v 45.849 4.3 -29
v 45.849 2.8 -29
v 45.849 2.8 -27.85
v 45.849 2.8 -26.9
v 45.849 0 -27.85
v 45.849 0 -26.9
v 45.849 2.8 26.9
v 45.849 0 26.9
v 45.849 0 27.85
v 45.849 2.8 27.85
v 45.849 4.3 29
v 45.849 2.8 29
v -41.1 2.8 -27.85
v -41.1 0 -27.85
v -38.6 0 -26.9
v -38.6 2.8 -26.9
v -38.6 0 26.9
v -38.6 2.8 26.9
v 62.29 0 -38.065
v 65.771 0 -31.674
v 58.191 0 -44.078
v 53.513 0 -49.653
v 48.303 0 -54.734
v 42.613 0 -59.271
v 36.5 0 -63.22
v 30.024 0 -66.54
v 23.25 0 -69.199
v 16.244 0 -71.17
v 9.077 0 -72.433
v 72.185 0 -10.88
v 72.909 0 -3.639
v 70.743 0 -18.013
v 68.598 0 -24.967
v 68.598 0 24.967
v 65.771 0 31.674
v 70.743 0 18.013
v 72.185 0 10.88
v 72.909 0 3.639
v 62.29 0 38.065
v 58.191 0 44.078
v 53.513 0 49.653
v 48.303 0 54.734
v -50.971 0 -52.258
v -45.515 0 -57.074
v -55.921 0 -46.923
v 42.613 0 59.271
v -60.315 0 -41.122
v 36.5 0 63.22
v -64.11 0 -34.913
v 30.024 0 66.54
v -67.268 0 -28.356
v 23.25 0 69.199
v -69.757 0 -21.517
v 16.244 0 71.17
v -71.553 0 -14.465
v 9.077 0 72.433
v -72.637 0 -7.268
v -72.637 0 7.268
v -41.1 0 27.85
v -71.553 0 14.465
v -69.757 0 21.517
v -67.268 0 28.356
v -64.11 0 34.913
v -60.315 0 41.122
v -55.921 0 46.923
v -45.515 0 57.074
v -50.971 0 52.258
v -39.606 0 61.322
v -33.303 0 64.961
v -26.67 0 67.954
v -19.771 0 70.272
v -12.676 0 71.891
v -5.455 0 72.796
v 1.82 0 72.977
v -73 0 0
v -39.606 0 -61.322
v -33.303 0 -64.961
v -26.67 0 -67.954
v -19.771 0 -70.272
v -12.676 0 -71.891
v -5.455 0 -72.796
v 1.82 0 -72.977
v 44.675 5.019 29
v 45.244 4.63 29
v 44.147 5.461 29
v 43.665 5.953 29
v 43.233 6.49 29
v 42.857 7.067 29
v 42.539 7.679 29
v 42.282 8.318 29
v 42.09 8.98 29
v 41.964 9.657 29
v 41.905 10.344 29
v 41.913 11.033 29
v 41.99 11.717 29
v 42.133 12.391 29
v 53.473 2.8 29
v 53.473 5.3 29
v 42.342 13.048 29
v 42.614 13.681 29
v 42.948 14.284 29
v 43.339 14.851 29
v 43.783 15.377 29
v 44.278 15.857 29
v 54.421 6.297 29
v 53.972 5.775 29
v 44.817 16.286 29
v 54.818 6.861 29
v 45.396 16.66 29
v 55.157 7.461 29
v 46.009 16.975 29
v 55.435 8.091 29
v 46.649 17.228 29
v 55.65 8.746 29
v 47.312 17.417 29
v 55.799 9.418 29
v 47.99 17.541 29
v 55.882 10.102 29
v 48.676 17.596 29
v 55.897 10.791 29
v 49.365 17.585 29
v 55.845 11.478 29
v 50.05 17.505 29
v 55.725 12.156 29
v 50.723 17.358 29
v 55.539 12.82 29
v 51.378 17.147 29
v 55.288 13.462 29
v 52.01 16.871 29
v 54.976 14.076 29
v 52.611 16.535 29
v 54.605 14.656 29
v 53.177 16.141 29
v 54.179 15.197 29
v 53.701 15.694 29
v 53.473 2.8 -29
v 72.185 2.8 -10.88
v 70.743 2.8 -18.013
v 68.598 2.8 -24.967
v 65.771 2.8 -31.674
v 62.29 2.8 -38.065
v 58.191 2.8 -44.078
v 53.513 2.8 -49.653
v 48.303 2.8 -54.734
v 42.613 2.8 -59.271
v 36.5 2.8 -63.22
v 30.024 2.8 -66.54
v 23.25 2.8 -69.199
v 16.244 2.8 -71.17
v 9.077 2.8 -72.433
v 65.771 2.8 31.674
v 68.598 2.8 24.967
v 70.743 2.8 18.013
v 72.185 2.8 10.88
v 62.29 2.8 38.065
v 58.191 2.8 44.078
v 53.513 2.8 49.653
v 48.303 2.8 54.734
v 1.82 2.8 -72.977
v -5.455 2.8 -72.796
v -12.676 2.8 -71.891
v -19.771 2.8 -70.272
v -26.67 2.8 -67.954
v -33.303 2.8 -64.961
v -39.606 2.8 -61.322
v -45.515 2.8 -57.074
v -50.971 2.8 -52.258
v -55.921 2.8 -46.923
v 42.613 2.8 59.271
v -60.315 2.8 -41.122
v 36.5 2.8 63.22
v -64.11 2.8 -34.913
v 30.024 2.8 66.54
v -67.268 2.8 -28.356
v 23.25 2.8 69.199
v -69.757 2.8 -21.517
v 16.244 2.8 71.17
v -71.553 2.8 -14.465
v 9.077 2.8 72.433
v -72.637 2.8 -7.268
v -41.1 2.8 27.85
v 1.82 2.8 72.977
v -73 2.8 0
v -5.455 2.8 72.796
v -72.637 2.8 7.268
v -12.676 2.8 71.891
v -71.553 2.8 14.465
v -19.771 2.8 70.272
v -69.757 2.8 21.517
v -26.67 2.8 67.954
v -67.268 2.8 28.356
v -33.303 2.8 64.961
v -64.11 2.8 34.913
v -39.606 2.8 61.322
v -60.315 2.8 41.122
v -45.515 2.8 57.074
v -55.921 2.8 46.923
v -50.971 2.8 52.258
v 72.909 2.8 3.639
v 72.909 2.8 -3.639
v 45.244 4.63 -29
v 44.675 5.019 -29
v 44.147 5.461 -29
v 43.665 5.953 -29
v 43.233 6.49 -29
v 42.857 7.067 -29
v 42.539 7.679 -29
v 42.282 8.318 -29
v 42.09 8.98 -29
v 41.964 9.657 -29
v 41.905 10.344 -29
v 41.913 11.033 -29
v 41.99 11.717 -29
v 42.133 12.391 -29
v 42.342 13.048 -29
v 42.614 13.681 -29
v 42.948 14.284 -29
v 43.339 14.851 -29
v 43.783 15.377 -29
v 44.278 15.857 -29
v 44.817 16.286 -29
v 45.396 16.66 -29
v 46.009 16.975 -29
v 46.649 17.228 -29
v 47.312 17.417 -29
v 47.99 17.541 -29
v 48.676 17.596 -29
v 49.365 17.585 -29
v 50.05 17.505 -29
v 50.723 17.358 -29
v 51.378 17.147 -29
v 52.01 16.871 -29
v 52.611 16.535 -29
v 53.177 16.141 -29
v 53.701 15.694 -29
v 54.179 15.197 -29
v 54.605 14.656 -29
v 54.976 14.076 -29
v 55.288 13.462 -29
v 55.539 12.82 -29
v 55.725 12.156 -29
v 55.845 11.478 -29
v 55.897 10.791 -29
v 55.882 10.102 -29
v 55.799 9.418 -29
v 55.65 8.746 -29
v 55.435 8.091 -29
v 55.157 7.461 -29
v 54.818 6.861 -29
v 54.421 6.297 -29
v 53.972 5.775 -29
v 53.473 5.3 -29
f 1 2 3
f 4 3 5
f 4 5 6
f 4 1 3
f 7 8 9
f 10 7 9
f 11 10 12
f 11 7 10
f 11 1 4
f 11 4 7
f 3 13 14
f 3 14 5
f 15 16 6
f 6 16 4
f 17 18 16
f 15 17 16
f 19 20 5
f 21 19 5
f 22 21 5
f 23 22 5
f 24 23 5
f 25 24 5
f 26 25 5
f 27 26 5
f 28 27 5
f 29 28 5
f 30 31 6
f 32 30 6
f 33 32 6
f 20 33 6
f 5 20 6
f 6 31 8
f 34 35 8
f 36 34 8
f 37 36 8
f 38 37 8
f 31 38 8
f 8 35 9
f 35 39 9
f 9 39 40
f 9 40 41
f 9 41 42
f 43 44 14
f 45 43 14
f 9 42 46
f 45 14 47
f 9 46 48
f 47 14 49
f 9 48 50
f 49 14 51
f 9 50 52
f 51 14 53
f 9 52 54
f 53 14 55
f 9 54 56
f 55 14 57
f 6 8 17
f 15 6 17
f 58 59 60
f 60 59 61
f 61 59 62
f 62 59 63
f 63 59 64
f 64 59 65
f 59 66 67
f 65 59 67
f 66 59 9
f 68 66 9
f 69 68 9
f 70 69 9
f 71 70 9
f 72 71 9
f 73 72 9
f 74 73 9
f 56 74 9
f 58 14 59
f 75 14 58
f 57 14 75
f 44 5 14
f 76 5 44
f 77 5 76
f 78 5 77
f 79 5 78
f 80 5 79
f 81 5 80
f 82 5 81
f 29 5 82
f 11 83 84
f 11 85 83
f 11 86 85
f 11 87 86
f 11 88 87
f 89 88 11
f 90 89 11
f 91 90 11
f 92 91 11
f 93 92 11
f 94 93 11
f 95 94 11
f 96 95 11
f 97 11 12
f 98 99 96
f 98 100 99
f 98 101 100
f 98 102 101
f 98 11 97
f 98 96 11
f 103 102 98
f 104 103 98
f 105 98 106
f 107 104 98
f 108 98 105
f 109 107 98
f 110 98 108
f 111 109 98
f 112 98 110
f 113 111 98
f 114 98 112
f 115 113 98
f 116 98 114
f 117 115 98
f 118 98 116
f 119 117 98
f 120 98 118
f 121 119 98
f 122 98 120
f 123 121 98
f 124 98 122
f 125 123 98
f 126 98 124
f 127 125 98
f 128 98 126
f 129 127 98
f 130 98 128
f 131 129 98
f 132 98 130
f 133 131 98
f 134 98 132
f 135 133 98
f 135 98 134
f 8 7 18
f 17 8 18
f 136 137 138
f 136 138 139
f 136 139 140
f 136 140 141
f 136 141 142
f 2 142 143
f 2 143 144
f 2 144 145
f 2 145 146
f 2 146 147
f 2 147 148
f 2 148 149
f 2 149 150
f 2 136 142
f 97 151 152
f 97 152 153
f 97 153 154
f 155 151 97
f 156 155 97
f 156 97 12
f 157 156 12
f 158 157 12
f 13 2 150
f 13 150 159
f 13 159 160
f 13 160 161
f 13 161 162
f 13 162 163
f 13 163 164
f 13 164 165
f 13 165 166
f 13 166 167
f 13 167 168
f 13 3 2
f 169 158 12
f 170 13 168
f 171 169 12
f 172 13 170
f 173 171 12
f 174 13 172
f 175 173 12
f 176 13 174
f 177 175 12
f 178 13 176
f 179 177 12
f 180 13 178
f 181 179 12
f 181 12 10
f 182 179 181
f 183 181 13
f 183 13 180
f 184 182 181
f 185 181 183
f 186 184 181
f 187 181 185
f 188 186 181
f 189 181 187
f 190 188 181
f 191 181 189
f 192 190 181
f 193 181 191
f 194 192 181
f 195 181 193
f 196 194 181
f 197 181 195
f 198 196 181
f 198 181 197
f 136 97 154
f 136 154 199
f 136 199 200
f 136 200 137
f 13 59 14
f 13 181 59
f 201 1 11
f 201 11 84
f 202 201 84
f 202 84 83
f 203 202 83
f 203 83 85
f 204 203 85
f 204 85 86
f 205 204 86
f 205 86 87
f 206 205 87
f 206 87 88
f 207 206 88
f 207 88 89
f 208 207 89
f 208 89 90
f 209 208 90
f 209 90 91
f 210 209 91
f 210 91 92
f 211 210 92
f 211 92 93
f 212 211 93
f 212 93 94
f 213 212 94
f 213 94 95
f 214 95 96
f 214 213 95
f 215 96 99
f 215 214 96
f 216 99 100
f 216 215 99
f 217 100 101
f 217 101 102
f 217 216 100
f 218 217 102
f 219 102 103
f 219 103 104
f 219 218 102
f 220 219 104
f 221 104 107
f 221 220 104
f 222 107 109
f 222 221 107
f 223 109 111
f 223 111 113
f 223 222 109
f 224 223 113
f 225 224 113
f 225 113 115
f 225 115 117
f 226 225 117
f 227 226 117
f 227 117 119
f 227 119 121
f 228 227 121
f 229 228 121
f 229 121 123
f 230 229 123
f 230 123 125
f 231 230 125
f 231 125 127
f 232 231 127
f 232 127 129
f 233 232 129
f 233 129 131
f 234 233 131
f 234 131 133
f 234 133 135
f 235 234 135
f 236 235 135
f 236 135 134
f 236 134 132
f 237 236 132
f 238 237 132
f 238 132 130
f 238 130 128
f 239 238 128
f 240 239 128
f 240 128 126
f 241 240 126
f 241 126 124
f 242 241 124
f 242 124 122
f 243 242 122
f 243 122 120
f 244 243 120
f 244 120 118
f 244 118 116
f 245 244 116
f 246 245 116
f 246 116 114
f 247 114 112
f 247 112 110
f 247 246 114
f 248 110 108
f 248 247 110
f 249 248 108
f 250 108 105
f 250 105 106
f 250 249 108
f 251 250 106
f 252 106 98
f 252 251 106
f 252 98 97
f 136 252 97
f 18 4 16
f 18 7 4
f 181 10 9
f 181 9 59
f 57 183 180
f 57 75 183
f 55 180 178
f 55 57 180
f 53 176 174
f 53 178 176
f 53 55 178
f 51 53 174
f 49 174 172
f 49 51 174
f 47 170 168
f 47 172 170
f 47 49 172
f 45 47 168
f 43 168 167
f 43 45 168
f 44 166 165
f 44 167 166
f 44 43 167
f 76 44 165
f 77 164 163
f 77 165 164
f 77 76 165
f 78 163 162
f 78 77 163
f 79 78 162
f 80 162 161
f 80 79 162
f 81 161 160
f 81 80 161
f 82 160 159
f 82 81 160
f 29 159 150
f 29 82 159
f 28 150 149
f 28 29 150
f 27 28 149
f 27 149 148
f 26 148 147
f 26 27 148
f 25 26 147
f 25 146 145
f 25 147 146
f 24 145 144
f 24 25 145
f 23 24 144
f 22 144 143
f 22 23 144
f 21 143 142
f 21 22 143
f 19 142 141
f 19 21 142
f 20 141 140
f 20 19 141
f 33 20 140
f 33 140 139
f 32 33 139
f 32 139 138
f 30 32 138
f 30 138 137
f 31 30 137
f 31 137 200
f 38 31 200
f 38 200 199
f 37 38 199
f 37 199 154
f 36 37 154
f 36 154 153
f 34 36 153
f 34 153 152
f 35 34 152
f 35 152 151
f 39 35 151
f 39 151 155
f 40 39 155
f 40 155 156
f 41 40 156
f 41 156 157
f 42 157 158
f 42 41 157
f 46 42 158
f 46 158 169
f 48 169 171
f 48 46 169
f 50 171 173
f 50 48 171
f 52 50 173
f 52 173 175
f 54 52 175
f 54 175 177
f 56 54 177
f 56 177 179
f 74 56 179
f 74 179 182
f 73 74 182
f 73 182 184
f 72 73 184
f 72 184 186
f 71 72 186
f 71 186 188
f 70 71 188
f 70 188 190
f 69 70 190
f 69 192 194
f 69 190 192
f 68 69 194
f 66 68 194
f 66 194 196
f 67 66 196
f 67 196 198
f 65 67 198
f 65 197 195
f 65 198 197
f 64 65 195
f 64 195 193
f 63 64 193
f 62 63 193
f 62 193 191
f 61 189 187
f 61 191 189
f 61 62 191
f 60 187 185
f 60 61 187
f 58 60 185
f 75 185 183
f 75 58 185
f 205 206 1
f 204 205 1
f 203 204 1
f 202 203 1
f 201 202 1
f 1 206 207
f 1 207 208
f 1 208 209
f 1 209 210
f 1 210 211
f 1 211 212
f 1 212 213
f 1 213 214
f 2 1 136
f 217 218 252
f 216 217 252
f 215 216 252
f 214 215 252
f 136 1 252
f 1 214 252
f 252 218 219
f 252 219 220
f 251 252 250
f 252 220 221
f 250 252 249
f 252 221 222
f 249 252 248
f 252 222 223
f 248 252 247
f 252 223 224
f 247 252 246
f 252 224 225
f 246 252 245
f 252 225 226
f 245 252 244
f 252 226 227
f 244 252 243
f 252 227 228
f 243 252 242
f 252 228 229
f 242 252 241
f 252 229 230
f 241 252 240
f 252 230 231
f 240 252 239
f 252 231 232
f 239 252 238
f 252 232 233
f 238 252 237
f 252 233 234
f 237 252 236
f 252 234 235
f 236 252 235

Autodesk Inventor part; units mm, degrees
ref_plane "YZ Plane" through (0, 0, 0) normal (1, 0, 0) x (0, 1, 0)
ref_plane "XZ Plane" through (0, 0, 0) normal (0, 1, 0) x (-1, 0, 0)
ref_plane "XY Plane" through (0, 0, 0) normal (0, 0, 1) x (1, 0, 0)
sketch "草圖1" plane through (0, 0, 0) normal (0, 1, 0) x (-1, 0, 0)
  circle A0 centre (0, 0) radius 73
  dimension "d0" = 146
extrude "擠出1" add sketch "草圖1" along normal blind 2.8
sketch "草圖2" plane through (0, 0, 0) normal (0, 0, 1) x (1, 0, 0)
  circle A0 centre (48.9, 10.6) radius 7
  line L0 (73, 0) -> (-73, 0) projected
  line L1 (73, 0) -> (73, 2.8) projected
  line L2 (53.4727, 5.3) -> (53.4727, 2.8)
  line L3 (73, 2.8) -> (-73, 2.8) projected
  line L4 (45.8488, 4.3) -> (45.8488, 2.8)
  point P0 (0, 0)
  point P1 (48.9, 17.6)
  point P2 (41.9, 10.6)
  dimension "d3" = 14
  dimension "d4" = 17.6
  dimension "d5" = 31.1
  dimension "d6" = 1.5
  dimension "d7" = 2.5
extrude "擠出2" add sketch "草圖2" along normal mid plane 58
sketch "草圖3" plane through (0, 2.8, 0) normal (0, 1, 0) x (1, 0, 0)
  line L0 (-41.1, 27.85) -> (45.8488, 27.85)
  line L1 (45.8488, 27.85) -> (45.8488, -27.85)
  line L2 (45.8488, -27.85) -> (-41.1, -27.85)
  line L3 (-41.1, -27.85) -> (-41.1, 27.85)
  line L4 (-38.6, 26.9) -> (45.8488, 26.9)
  line L5 (45.8488, 26.9) -> (45.8488, -26.9)
  line L6 (45.8488, -26.9) -> (-38.6, -26.9)
  line L7 (-38.6, -26.9) -> (-38.6, 26.9)
  line L8 (45.8488, -29) -> (45.8488, 29) projected
  line L9 (41.9, 29) -> (41.9, -29) projected
  point P0 (0, 0)
  point P1 (-38.6, 0)
  point P2 (-41.1, 0)
  point P3 (41.9, -27.85)
  point P4 (41.9, -26.9)
  point P5 (41.9, 26.9)
  point P6 (41.9, 27.85)
  dimension "d10" = 55.7
  dimension "d11" = 53.8
  dimension "d12" = 80.5
  dimension "d13" = 83
extrude "擠出3" cut sketch "草圖3" against normal through all contours L0 L9 L4 L7 L6 L2 L3 | L0 L1 L4 L9 | L9 L6 L1 L2
properties part number "平板架"
